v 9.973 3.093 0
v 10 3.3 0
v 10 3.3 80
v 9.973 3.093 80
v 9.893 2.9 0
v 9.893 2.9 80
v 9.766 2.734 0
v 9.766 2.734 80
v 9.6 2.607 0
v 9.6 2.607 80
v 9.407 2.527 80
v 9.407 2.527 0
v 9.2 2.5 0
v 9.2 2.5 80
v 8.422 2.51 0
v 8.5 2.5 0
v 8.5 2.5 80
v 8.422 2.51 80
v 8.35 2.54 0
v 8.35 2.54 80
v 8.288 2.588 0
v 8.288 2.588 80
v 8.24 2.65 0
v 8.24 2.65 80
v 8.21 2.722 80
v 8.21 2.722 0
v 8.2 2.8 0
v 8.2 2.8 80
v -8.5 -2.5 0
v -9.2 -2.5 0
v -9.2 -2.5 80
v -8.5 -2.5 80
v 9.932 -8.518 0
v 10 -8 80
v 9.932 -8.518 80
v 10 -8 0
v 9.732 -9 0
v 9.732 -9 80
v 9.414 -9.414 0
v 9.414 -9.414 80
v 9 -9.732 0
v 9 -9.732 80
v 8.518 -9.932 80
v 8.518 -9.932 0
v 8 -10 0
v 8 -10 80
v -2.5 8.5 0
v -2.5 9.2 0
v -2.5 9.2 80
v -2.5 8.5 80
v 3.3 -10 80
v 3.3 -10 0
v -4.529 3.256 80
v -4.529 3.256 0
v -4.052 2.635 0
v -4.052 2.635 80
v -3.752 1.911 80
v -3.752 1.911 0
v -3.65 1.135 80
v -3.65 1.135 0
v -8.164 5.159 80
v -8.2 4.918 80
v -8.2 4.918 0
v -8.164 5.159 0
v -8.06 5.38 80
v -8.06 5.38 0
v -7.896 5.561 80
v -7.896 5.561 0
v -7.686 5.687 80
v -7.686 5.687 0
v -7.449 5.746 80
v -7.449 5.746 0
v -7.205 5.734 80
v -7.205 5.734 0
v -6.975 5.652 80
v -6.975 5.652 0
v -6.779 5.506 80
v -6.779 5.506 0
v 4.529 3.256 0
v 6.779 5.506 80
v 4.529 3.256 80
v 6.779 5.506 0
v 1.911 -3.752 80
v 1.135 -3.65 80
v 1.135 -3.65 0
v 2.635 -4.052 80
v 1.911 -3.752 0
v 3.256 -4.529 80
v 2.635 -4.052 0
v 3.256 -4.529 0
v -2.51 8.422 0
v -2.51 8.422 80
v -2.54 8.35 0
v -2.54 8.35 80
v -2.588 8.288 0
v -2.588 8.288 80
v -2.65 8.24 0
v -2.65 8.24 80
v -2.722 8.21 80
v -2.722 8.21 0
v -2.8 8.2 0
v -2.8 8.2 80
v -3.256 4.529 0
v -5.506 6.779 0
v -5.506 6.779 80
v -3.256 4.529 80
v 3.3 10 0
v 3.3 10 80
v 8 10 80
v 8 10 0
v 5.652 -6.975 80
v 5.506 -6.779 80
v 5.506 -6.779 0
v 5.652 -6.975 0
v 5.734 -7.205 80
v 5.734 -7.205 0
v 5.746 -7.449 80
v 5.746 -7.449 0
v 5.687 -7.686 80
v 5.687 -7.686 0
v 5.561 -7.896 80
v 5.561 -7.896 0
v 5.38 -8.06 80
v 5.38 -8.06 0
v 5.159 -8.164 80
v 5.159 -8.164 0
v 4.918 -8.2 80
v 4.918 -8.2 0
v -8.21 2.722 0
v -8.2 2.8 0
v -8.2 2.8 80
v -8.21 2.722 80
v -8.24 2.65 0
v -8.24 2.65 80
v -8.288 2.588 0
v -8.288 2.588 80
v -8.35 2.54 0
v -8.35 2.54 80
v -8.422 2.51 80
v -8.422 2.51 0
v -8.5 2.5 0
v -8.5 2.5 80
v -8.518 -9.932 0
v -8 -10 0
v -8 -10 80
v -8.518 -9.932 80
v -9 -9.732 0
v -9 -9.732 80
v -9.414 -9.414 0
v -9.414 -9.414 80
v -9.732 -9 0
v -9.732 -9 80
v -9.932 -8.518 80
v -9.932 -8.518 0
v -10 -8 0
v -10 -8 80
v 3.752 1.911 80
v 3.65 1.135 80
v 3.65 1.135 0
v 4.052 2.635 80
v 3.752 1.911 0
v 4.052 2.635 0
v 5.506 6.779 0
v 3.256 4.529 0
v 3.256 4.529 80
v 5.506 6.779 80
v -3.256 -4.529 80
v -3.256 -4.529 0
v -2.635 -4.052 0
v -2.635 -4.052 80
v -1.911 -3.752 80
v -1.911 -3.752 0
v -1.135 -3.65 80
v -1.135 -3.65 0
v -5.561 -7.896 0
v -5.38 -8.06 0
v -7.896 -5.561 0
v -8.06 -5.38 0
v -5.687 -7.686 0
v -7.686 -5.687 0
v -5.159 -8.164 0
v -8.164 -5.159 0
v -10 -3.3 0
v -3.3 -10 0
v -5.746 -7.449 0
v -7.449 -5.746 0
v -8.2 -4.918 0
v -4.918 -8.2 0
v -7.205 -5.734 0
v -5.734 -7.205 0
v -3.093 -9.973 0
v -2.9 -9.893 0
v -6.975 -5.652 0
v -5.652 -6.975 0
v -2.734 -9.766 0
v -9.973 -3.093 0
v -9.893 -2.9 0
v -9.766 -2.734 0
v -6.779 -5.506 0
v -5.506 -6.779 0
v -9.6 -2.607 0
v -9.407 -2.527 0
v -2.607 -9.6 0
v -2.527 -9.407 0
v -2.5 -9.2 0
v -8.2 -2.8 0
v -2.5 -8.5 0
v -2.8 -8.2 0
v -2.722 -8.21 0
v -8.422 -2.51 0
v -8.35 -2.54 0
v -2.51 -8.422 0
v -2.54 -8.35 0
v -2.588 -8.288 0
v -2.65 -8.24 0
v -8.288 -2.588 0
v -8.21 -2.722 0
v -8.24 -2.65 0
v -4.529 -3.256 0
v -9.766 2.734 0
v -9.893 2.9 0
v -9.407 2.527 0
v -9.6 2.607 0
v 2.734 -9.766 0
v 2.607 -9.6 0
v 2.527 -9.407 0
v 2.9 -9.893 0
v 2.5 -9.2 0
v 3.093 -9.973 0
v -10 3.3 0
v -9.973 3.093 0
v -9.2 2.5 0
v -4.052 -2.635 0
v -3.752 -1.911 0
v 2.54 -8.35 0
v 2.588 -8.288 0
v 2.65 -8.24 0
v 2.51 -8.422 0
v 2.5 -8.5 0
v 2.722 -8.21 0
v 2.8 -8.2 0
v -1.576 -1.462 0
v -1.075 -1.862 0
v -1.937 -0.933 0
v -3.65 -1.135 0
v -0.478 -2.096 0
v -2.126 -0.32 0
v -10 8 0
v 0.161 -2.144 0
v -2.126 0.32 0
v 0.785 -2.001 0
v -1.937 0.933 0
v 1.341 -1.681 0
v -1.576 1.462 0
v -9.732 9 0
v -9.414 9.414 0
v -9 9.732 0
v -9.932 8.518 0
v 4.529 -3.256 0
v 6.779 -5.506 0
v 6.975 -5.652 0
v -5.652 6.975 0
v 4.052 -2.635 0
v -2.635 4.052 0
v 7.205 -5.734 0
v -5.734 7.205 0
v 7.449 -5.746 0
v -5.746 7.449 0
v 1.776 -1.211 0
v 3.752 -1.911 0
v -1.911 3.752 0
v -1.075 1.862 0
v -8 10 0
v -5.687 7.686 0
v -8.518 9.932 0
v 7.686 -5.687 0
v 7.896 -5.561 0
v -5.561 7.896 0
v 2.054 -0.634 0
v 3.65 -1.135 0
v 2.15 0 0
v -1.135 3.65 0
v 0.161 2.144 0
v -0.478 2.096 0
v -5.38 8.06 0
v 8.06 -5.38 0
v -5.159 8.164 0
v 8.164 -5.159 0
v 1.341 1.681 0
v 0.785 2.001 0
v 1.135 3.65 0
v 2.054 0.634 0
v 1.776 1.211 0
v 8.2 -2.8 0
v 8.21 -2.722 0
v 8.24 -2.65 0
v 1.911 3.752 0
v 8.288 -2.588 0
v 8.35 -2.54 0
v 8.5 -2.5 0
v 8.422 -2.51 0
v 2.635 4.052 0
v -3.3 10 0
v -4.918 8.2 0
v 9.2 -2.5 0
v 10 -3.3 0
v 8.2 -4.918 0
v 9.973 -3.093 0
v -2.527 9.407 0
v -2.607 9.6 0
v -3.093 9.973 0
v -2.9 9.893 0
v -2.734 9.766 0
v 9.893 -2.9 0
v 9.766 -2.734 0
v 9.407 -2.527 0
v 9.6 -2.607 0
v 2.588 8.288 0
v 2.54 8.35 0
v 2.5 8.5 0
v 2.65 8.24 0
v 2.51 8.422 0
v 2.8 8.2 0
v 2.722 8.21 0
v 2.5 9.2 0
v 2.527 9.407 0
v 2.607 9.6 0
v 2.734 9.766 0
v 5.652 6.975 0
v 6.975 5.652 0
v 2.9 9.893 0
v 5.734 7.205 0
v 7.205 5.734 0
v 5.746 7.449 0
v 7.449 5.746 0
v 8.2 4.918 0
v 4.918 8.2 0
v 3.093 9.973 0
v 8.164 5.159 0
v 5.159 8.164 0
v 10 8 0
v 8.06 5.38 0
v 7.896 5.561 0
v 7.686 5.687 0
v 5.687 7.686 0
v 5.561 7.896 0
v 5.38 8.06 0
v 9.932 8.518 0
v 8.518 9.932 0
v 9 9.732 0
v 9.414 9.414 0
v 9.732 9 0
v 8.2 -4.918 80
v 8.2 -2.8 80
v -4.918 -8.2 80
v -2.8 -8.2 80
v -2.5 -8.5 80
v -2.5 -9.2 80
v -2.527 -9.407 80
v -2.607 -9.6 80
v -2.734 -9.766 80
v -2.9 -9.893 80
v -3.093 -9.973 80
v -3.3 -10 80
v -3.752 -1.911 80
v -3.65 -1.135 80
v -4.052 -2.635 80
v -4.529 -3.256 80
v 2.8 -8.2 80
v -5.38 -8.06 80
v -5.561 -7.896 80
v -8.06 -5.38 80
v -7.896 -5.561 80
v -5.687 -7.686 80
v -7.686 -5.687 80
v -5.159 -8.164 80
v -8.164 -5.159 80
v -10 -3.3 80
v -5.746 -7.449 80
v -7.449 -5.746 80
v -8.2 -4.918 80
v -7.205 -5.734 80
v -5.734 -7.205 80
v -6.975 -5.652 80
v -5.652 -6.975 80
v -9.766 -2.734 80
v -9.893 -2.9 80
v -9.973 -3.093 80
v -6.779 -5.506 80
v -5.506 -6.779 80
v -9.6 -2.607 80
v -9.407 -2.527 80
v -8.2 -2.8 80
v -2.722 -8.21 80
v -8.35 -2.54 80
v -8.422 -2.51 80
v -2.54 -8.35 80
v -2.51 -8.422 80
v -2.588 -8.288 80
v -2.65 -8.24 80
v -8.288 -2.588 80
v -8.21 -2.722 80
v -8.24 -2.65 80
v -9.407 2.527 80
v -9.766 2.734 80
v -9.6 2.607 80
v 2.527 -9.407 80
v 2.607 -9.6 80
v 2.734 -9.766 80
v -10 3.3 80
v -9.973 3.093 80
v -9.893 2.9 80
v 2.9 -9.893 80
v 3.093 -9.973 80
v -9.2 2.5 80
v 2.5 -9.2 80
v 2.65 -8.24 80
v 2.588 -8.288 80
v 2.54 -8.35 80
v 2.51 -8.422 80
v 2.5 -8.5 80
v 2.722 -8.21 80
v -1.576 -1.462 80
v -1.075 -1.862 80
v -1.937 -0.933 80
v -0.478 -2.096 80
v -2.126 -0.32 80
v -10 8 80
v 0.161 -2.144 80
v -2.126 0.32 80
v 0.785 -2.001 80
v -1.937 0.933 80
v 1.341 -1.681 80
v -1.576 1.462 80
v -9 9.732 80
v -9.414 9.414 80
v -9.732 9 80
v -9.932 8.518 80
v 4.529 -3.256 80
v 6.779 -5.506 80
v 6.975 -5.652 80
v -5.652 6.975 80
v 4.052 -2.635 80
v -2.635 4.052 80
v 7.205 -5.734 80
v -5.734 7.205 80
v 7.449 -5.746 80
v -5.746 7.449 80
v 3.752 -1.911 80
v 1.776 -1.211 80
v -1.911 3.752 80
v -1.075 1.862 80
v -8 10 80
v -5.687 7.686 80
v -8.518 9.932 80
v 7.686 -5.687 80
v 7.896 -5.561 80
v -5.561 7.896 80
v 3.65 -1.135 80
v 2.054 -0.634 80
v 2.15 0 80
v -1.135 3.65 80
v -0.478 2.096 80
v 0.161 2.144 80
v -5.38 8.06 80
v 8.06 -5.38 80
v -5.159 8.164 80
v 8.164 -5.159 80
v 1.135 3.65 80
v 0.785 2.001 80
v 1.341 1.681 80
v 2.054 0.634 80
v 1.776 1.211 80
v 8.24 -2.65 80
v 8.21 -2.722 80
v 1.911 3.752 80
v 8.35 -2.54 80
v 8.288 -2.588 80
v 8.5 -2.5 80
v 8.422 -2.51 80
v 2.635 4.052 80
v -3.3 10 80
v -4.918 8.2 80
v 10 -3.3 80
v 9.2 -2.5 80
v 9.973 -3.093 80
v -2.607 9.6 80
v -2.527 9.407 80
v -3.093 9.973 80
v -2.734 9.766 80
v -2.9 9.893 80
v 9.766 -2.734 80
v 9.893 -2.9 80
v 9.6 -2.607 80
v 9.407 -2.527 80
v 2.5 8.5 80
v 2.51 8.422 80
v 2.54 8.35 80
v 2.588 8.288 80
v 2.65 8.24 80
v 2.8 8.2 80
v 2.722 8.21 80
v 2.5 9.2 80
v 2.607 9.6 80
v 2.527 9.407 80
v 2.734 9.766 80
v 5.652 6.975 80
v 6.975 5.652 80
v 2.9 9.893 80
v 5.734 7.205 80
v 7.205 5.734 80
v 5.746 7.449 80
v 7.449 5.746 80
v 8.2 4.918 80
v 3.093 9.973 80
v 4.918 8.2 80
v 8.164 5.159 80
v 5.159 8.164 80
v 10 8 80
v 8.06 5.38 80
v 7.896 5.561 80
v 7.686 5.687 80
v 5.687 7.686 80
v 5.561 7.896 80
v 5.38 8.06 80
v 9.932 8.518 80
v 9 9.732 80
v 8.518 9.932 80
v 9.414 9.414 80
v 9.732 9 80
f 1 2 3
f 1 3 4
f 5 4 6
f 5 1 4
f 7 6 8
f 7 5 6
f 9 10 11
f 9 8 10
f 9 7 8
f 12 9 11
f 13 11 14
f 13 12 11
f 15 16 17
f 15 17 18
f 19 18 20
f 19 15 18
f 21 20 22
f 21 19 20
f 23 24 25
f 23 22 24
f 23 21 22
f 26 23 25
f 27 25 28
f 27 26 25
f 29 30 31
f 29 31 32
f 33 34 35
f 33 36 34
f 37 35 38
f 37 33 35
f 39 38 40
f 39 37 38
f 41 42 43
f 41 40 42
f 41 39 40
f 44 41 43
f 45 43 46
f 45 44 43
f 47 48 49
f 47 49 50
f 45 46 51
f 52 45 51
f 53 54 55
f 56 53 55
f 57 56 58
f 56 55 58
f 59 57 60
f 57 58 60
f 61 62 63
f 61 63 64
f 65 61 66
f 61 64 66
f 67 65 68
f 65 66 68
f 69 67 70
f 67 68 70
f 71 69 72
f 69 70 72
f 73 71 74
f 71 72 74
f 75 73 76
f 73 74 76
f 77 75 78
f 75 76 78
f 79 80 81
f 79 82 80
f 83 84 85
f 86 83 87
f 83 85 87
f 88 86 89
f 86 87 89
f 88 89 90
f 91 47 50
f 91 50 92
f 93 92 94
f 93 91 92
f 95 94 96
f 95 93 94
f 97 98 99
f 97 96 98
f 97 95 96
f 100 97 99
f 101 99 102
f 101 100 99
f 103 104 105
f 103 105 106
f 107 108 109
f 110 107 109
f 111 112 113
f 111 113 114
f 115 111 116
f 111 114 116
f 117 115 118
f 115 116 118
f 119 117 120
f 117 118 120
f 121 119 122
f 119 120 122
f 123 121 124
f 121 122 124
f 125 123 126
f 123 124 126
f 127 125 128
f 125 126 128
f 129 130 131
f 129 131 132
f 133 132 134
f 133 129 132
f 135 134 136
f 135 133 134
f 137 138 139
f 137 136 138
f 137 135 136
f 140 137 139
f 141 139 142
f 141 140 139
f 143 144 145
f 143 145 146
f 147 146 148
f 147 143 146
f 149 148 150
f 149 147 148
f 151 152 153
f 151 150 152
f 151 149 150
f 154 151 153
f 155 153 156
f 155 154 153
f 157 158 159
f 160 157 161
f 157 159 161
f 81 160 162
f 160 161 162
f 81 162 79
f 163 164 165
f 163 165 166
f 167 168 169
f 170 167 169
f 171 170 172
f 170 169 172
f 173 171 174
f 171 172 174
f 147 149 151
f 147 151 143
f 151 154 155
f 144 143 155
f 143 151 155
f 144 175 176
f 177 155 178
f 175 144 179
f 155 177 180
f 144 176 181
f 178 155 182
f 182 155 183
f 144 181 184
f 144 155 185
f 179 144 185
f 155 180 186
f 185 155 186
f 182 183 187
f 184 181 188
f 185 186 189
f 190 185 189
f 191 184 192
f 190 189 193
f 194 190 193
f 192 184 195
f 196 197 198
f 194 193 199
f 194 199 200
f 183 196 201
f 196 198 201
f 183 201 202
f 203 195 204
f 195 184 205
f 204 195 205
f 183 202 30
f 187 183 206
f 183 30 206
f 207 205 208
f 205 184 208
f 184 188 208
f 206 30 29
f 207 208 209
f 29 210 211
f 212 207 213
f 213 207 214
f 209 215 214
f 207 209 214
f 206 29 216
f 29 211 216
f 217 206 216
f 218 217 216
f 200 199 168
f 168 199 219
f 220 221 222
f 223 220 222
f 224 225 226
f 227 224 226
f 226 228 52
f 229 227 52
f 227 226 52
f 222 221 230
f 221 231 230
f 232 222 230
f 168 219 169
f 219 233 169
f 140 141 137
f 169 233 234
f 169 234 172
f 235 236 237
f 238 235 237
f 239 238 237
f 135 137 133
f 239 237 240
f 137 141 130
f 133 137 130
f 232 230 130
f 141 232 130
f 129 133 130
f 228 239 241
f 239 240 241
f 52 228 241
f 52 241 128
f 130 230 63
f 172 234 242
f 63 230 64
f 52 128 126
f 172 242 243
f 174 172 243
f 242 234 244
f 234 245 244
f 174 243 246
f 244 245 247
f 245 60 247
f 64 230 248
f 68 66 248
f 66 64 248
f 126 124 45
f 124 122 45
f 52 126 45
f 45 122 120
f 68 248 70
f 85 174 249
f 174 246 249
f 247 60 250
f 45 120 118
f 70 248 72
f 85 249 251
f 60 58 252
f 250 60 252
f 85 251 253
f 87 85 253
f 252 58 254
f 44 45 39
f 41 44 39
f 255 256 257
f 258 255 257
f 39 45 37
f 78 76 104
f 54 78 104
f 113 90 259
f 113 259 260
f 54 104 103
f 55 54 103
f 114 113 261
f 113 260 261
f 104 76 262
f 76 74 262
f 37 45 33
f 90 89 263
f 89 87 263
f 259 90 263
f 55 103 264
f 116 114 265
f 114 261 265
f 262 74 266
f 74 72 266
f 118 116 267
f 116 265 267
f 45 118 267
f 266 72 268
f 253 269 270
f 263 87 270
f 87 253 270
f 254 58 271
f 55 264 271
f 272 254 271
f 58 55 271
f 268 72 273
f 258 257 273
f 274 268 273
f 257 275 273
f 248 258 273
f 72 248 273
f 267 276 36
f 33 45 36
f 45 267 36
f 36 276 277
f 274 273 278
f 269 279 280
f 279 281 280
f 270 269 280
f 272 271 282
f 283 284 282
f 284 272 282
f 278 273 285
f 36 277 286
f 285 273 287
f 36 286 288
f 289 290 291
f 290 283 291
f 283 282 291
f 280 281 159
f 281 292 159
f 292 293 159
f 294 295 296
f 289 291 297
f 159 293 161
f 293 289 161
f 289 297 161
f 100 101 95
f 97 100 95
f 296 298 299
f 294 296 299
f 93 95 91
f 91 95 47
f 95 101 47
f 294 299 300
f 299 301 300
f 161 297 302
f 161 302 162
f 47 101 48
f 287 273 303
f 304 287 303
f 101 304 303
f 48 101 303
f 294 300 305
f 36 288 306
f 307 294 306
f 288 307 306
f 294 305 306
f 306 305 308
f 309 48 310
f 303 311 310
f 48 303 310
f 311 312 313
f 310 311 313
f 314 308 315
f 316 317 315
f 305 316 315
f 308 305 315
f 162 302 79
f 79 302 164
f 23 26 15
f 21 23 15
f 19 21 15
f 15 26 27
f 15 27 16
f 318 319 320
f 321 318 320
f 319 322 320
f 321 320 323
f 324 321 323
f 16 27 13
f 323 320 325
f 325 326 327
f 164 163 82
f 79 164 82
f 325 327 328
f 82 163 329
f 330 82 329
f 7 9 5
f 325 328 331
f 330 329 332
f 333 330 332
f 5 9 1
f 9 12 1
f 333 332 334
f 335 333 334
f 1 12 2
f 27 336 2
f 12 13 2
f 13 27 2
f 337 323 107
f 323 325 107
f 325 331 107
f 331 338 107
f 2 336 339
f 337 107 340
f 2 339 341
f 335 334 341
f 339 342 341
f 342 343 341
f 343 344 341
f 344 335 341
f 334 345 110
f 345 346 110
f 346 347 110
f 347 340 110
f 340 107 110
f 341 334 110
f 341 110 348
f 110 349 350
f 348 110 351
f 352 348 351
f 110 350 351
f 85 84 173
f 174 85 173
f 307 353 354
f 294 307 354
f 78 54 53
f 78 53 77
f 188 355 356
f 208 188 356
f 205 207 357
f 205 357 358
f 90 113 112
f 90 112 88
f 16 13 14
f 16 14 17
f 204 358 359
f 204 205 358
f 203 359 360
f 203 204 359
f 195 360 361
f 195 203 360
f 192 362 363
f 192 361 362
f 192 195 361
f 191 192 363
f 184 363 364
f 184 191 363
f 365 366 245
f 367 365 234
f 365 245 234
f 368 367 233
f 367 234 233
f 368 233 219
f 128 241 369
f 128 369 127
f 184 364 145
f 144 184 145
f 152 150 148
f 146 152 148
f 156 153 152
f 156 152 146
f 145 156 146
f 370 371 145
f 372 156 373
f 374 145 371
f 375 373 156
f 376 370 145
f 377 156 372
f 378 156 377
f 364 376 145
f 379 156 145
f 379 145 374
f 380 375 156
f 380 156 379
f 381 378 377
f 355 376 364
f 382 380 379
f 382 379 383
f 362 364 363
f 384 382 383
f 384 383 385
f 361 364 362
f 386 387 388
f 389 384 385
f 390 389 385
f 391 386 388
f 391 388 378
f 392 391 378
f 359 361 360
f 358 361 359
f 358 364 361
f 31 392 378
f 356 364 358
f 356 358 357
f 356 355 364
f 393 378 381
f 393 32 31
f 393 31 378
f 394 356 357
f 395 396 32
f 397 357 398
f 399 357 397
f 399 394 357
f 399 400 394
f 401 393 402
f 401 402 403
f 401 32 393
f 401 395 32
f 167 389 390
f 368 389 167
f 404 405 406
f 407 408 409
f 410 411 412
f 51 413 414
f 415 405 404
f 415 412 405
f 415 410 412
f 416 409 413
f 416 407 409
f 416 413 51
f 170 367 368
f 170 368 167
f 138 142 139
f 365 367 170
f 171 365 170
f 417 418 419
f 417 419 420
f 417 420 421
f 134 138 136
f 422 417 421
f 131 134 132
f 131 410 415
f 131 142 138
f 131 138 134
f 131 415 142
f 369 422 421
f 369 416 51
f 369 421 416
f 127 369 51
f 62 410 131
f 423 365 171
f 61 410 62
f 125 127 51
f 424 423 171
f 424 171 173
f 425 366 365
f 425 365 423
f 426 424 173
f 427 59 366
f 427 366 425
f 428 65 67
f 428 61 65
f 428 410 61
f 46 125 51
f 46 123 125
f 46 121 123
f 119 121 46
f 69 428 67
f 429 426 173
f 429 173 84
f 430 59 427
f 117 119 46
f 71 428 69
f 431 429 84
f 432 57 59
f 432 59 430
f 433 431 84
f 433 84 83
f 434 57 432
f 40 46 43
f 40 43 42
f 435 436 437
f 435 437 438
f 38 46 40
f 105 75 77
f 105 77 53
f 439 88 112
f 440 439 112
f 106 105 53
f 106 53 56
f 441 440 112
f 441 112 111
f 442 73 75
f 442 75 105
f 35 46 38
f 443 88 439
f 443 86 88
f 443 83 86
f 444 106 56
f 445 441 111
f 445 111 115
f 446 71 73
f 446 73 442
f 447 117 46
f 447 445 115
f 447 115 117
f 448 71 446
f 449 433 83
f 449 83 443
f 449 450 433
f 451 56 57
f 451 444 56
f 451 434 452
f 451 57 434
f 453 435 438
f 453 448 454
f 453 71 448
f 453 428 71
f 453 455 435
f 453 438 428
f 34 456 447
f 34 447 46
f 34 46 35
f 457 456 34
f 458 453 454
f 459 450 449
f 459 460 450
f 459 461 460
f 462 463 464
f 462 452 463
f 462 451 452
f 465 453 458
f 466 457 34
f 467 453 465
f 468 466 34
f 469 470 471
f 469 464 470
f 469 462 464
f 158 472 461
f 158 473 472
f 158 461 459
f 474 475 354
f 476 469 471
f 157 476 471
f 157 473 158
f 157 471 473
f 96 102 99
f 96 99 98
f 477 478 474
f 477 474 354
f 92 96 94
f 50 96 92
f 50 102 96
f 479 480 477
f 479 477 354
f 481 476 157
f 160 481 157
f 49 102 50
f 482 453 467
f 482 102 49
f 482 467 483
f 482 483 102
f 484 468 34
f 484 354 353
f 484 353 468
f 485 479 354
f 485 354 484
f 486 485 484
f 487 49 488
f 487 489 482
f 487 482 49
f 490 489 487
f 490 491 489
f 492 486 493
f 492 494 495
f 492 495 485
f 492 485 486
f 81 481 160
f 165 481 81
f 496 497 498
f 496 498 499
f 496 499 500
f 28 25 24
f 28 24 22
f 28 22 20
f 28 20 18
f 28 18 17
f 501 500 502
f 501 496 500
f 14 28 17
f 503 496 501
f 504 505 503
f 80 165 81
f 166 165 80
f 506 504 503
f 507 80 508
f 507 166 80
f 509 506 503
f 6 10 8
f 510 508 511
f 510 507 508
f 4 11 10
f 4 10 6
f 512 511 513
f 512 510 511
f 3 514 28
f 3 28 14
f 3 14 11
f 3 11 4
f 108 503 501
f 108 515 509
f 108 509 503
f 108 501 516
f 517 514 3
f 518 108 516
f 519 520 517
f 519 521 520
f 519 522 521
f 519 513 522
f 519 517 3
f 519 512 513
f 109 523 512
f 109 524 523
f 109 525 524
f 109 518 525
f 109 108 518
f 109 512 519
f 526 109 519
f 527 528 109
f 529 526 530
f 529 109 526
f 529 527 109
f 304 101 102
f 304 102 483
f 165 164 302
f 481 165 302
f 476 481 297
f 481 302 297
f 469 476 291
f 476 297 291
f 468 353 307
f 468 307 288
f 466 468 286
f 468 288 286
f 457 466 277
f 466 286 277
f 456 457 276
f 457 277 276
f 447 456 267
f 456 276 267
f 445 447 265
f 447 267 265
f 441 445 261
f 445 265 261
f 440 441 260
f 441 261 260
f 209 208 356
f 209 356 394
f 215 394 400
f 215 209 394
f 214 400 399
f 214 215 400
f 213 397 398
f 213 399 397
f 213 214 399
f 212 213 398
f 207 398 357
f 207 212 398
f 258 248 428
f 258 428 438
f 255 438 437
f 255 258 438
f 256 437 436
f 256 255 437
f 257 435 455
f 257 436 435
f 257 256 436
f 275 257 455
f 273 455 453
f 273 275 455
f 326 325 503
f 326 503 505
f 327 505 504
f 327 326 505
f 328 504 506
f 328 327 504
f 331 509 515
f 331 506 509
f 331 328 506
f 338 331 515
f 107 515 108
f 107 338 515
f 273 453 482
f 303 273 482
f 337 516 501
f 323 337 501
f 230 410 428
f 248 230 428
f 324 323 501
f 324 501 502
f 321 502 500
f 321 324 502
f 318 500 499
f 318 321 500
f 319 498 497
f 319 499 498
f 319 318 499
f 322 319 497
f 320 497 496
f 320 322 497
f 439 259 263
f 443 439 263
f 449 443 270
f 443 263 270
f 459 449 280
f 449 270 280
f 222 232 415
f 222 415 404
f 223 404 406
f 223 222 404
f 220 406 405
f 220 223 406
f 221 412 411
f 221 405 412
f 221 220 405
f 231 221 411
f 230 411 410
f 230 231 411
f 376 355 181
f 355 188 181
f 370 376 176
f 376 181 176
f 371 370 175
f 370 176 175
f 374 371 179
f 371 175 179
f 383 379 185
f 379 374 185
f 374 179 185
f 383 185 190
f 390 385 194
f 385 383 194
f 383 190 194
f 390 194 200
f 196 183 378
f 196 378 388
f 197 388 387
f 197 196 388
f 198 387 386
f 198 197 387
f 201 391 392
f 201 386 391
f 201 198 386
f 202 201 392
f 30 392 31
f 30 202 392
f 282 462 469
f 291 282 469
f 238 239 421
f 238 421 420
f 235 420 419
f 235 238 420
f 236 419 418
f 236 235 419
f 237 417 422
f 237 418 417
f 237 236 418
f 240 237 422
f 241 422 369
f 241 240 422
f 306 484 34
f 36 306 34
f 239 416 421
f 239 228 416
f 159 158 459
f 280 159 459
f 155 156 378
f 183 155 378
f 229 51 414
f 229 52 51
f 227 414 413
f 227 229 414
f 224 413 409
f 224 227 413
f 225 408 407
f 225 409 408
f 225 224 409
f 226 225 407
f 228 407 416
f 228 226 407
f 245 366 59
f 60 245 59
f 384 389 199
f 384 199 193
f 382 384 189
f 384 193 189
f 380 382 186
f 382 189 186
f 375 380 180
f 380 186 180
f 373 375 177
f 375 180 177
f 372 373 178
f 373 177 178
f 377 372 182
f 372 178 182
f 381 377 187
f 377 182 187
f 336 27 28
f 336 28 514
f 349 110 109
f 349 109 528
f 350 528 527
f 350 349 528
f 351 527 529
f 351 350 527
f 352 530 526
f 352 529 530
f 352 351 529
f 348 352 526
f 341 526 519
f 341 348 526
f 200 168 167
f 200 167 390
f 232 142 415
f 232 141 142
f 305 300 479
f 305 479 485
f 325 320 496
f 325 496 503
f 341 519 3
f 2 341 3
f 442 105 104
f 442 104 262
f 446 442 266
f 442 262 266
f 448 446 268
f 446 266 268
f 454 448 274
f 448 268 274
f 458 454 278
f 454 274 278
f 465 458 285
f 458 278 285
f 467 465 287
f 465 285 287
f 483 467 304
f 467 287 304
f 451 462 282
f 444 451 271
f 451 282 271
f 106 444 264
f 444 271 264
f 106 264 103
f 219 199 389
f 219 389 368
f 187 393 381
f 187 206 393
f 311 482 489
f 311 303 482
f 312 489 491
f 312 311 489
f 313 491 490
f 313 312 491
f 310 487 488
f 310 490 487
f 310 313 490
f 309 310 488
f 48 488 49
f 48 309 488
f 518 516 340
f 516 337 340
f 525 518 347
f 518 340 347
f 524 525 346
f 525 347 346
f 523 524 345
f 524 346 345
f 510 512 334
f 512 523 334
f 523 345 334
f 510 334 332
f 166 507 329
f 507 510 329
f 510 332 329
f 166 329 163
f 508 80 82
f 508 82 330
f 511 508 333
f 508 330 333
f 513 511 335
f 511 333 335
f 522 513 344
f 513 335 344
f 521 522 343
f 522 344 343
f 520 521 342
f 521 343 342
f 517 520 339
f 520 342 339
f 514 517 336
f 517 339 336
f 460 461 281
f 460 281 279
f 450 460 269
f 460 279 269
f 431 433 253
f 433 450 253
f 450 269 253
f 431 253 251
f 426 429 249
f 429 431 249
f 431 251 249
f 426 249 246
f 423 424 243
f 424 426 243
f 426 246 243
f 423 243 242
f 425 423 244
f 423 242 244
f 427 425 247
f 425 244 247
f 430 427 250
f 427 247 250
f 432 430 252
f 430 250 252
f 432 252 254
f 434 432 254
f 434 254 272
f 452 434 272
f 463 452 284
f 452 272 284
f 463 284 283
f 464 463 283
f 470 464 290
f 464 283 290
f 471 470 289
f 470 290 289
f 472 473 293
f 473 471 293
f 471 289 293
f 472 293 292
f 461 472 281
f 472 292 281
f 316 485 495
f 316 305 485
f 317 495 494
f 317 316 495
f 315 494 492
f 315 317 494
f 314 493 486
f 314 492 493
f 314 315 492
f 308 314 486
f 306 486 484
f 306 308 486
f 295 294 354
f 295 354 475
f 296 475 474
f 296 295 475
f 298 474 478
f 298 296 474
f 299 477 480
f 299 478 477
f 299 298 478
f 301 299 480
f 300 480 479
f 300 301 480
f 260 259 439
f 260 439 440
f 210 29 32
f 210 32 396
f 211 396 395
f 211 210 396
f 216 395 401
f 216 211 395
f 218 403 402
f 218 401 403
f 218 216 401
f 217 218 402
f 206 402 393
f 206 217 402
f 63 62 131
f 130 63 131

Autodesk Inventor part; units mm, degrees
ref_plane "YZ Plane" through (0, 0, 0) normal (1, 0, 0) x (0, 1, 0)
ref_plane "Startebene" through (0, 0, 0) normal (0, 0, 1) x (1, 0, 0)
ref_plane "Endebene" through (0, 0, 80) normal (0, 0, 1) x (1, 0, 0)
sketch "Skizze" plane through (0, 0, 0) normal (0, 0, 1) x (1, 0, 0)
  arc A0 (-4.5287, -3.2559) -> (-3.65, -1.1346) centre (-6.65, -1.1346) ccw
  line L0 (-3.65, -1.1346) -> (-3.65, 1.1346)
  circle A1 centre (0, 0) radius 2.15
  line L1 (1.1346, -3.65) -> (-1.1346, -3.65)
  arc A2 (-1.1346, -3.65) -> (-3.2559, -4.5287) centre (-1.1346, -6.65) ccw
  line L2 (-6.779, -5.5062) -> (-4.5287, -3.2559)
  line L3 (-3.2559, -4.5287) -> (-5.5062, -6.779)
  arc A3 (-2.5, -8.5) -> (-2.8, -8.2) centre (-2.8, -8.5) ccw
  line L4 (-2.5, -8.5) -> (-2.5, -9.2)
  line L5 (-4.9176, -8.2) -> (-2.8, -8.2)
  arc A4 (-5.5062, -6.779) -> (-4.9176, -8.2) centre (-4.9176, -7.3676) ccw
  arc A5 (-3.3, -10) -> (-2.5, -9.2) centre (-3.3, -9.2) ccw
  line L6 (-3.3, -10) -> (-8, -10)
  line L7 (10, -3.3) -> (10, -8)
  line L8 (5.5062, -6.779) -> (3.2559, -4.5287)
  arc A6 (6.779, -5.5062) -> (8.2, -4.9176) centre (7.3676, -4.9176) ccw
  arc A7 (3.2559, -4.5287) -> (1.1346, -3.65) centre (1.1346, -6.65) ccw
  line L9 (4.5287, -3.2559) -> (6.779, -5.5062)
  arc A8 (3.65, -1.1346) -> (4.5287, -3.2559) centre (6.65, -1.1346) ccw
  arc A9 (8.5, -2.5) -> (8.2, -2.8) centre (8.5, -2.8) ccw
  line L10 (3.65, 1.1346) -> (3.65, -1.1346)
  line L11 (8.5, -2.5) -> (9.2, -2.5)
  arc A10 (10, -3.3) -> (9.2, -2.5) centre (9.2, -3.3) ccw
  line L12 (8.2, -4.9176) -> (8.2, -2.8)
  line L13 (2.5, 8.5) -> (2.5, 9.2)
  arc A11 (2.5, 8.5) -> (2.8, 8.2) centre (2.8, 8.5) ccw
  arc A12 (1.1346, 3.65) -> (3.2559, 4.5287) centre (1.1346, 6.65) ccw
  line L14 (-1.1346, 3.65) -> (1.1346, 3.65)
  arc A13 (3.3, 10) -> (2.5, 9.2) centre (3.3, 9.2) ccw
  line L15 (4.9176, 8.2) -> (2.8, 8.2)
  arc A14 (4.5287, 3.2559) -> (3.65, 1.1346) centre (6.65, 1.1346) ccw
  line L16 (3.2559, 4.5287) -> (5.5062, 6.779)
  arc A15 (5.5062, 6.779) -> (4.9176, 8.2) centre (4.9176, 7.3676) ccw
  line L17 (6.779, 5.5062) -> (4.5287, 3.2559)
  line L18 (3.3, 10) -> (8, 10)
  arc A16 (10, 8) -> (8, 10) centre (8, 8) ccw
  line L19 (8.2, 2.8) -> (8.2, 4.9176)
  line L20 (10, 8) -> (10, 3.3)
  arc A17 (8.2, 4.9176) -> (6.779, 5.5062) centre (7.3676, 4.9176) ccw
  line L21 (-2.8, 8.2) -> (-4.9176, 8.2)
  line L22 (-2.5, 9.2) -> (-2.5, 8.5)
  arc A18 (-2.5, 9.2) -> (-3.3, 10) centre (-3.3, 9.2) ccw
  arc A19 (-2.8, 8.2) -> (-2.5, 8.5) centre (-2.8, 8.5) ccw
  arc A20 (-3.65, 1.1346) -> (-4.5287, 3.2559) centre (-6.65, 1.1346) ccw
  arc A21 (-3.2559, 4.5287) -> (-1.1346, 3.65) centre (-1.1346, 6.65) ccw
  arc A22 (4.9176, -8.2) -> (5.5062, -6.779) centre (4.9176, -7.3676) ccw
  arc A23 (8, -10) -> (10, -8) centre (8, -8) ccw
  line L23 (2.8, -8.2) -> (4.9176, -8.2)
  line L24 (8, -10) -> (3.3, -10)
  arc A24 (2.8, -8.2) -> (2.5, -8.5) centre (2.8, -8.5) ccw
  arc A25 (2.5, -9.2) -> (3.3, -10) centre (3.3, -9.2) ccw
  line L25 (2.5, -9.2) -> (2.5, -8.5)
  arc A26 (8.2, 2.8) -> (8.5, 2.5) centre (8.5, 2.8) ccw
  line L26 (9.2, 2.5) -> (8.5, 2.5)
  arc A27 (9.2, 2.5) -> (10, 3.3) centre (9.2, 3.3) ccw
  arc A28 (-4.9176, 8.2) -> (-5.5062, 6.779) centre (-4.9176, 7.3676) ccw
  line L27 (-8, 10) -> (-3.3, 10)
  line L28 (-5.5062, 6.779) -> (-3.2559, 4.5287)
  arc A29 (-8, 10) -> (-10, 8) centre (-8, 8) ccw
  arc A30 (-6.779, 5.5062) -> (-8.2, 4.9176) centre (-7.3676, 4.9176) ccw
  line L29 (-10, 3.3) -> (-10, 8)
  line L30 (-8.2, 4.9176) -> (-8.2, 2.8)
  arc A31 (-8.5, 2.5) -> (-8.2, 2.8) centre (-8.5, 2.8) ccw
  line L31 (-8.5, 2.5) -> (-9.2, 2.5)
  arc A32 (-10, 3.3) -> (-9.2, 2.5) centre (-9.2, 3.3) ccw
  line L32 (-4.5287, 3.2559) -> (-6.779, 5.5062)
  line L33 (-10, -8) -> (-10, -3.3)
  arc A33 (-8.2, -4.9176) -> (-6.779, -5.5062) centre (-7.3676, -4.9176) ccw
  arc A34 (-10, -8) -> (-8, -10) centre (-8, -8) ccw
  line L34 (-10, -8) -> (-10, -3.3)
  arc A35 (-8.2, -2.8) -> (-8.5, -2.5) centre (-8.5, -2.8) ccw
  line L35 (-9.2, -2.5) -> (-8.5, -2.5)
  arc A36 (-9.2, -2.5) -> (-10, -3.3) centre (-9.2, -3.3) ccw
  line L36 (-8.2, -2.8) -> (-8.2, -4.9176)
  dimension "d4" = 4.3
  dimension "d5" = 6.35
  dimension "d6" = 10
  dimension "d7" = 2.5
  dimension "d8" = 5.8
  dimension "d9" = 10.5
  dimension "d10" = 3
  dimension "d11" = 7.5
  dimension "d12" = 12.5
  dimension "d13" = 13.65
  dimension "d14" = 5.7
  dimension "d15" = 10.7
  dimension "d16" = 1.15
  dimension "d17" = 6.15
  dimension "d18" = 1.8
  dimension "d19" = 0.8
  dimension "d20" = 0.3
  dimension "d21" = 2
  dimension "d22" = 0.8324
  dimension "d23" = 45
  dimension "d24" = 90
  dimension "d25" = 90
  dimension "d26" = 1.8
  dimension "d27" = 18.2
  dimension "d28" = 20
  dimension "d29" = 5
  dimension "d30" = 7.5
  dimension "d31" = 1.8
  dimension "d32" = 0.9
  dimension "d33" = 0.9
  dimension "d34" = 20
extrude "Körper" add sketch "Skizze" along normal up to surface (80 mm away) from surface at 0
sketch "Skizze6" plane through (0, 0, 0) normal (0, 0, 1) x (1, 0, 0)
  line L0 (0, 0) -> (10, 0)
ref_plane "Arbeitsebene4" through (0, 0, 0) normal (0, -1, 0) x (1, 0, 0)
sketch "Skizze7" plane through (0, 0, 0) normal (0, -1, 0) x (1, 0, 0)
  line L0 (-2, 0) -> (12, 0)
  line L1 (-2, 80) -> (12, 80)
  dimension "d43" = 80
equation "\"G_OFFSET_START\" = 0"
equation "\"G_OFFSET_END\" = 0"
equation "\"G_L\" = d43"
properties part number "BT001_trajan20_22"
